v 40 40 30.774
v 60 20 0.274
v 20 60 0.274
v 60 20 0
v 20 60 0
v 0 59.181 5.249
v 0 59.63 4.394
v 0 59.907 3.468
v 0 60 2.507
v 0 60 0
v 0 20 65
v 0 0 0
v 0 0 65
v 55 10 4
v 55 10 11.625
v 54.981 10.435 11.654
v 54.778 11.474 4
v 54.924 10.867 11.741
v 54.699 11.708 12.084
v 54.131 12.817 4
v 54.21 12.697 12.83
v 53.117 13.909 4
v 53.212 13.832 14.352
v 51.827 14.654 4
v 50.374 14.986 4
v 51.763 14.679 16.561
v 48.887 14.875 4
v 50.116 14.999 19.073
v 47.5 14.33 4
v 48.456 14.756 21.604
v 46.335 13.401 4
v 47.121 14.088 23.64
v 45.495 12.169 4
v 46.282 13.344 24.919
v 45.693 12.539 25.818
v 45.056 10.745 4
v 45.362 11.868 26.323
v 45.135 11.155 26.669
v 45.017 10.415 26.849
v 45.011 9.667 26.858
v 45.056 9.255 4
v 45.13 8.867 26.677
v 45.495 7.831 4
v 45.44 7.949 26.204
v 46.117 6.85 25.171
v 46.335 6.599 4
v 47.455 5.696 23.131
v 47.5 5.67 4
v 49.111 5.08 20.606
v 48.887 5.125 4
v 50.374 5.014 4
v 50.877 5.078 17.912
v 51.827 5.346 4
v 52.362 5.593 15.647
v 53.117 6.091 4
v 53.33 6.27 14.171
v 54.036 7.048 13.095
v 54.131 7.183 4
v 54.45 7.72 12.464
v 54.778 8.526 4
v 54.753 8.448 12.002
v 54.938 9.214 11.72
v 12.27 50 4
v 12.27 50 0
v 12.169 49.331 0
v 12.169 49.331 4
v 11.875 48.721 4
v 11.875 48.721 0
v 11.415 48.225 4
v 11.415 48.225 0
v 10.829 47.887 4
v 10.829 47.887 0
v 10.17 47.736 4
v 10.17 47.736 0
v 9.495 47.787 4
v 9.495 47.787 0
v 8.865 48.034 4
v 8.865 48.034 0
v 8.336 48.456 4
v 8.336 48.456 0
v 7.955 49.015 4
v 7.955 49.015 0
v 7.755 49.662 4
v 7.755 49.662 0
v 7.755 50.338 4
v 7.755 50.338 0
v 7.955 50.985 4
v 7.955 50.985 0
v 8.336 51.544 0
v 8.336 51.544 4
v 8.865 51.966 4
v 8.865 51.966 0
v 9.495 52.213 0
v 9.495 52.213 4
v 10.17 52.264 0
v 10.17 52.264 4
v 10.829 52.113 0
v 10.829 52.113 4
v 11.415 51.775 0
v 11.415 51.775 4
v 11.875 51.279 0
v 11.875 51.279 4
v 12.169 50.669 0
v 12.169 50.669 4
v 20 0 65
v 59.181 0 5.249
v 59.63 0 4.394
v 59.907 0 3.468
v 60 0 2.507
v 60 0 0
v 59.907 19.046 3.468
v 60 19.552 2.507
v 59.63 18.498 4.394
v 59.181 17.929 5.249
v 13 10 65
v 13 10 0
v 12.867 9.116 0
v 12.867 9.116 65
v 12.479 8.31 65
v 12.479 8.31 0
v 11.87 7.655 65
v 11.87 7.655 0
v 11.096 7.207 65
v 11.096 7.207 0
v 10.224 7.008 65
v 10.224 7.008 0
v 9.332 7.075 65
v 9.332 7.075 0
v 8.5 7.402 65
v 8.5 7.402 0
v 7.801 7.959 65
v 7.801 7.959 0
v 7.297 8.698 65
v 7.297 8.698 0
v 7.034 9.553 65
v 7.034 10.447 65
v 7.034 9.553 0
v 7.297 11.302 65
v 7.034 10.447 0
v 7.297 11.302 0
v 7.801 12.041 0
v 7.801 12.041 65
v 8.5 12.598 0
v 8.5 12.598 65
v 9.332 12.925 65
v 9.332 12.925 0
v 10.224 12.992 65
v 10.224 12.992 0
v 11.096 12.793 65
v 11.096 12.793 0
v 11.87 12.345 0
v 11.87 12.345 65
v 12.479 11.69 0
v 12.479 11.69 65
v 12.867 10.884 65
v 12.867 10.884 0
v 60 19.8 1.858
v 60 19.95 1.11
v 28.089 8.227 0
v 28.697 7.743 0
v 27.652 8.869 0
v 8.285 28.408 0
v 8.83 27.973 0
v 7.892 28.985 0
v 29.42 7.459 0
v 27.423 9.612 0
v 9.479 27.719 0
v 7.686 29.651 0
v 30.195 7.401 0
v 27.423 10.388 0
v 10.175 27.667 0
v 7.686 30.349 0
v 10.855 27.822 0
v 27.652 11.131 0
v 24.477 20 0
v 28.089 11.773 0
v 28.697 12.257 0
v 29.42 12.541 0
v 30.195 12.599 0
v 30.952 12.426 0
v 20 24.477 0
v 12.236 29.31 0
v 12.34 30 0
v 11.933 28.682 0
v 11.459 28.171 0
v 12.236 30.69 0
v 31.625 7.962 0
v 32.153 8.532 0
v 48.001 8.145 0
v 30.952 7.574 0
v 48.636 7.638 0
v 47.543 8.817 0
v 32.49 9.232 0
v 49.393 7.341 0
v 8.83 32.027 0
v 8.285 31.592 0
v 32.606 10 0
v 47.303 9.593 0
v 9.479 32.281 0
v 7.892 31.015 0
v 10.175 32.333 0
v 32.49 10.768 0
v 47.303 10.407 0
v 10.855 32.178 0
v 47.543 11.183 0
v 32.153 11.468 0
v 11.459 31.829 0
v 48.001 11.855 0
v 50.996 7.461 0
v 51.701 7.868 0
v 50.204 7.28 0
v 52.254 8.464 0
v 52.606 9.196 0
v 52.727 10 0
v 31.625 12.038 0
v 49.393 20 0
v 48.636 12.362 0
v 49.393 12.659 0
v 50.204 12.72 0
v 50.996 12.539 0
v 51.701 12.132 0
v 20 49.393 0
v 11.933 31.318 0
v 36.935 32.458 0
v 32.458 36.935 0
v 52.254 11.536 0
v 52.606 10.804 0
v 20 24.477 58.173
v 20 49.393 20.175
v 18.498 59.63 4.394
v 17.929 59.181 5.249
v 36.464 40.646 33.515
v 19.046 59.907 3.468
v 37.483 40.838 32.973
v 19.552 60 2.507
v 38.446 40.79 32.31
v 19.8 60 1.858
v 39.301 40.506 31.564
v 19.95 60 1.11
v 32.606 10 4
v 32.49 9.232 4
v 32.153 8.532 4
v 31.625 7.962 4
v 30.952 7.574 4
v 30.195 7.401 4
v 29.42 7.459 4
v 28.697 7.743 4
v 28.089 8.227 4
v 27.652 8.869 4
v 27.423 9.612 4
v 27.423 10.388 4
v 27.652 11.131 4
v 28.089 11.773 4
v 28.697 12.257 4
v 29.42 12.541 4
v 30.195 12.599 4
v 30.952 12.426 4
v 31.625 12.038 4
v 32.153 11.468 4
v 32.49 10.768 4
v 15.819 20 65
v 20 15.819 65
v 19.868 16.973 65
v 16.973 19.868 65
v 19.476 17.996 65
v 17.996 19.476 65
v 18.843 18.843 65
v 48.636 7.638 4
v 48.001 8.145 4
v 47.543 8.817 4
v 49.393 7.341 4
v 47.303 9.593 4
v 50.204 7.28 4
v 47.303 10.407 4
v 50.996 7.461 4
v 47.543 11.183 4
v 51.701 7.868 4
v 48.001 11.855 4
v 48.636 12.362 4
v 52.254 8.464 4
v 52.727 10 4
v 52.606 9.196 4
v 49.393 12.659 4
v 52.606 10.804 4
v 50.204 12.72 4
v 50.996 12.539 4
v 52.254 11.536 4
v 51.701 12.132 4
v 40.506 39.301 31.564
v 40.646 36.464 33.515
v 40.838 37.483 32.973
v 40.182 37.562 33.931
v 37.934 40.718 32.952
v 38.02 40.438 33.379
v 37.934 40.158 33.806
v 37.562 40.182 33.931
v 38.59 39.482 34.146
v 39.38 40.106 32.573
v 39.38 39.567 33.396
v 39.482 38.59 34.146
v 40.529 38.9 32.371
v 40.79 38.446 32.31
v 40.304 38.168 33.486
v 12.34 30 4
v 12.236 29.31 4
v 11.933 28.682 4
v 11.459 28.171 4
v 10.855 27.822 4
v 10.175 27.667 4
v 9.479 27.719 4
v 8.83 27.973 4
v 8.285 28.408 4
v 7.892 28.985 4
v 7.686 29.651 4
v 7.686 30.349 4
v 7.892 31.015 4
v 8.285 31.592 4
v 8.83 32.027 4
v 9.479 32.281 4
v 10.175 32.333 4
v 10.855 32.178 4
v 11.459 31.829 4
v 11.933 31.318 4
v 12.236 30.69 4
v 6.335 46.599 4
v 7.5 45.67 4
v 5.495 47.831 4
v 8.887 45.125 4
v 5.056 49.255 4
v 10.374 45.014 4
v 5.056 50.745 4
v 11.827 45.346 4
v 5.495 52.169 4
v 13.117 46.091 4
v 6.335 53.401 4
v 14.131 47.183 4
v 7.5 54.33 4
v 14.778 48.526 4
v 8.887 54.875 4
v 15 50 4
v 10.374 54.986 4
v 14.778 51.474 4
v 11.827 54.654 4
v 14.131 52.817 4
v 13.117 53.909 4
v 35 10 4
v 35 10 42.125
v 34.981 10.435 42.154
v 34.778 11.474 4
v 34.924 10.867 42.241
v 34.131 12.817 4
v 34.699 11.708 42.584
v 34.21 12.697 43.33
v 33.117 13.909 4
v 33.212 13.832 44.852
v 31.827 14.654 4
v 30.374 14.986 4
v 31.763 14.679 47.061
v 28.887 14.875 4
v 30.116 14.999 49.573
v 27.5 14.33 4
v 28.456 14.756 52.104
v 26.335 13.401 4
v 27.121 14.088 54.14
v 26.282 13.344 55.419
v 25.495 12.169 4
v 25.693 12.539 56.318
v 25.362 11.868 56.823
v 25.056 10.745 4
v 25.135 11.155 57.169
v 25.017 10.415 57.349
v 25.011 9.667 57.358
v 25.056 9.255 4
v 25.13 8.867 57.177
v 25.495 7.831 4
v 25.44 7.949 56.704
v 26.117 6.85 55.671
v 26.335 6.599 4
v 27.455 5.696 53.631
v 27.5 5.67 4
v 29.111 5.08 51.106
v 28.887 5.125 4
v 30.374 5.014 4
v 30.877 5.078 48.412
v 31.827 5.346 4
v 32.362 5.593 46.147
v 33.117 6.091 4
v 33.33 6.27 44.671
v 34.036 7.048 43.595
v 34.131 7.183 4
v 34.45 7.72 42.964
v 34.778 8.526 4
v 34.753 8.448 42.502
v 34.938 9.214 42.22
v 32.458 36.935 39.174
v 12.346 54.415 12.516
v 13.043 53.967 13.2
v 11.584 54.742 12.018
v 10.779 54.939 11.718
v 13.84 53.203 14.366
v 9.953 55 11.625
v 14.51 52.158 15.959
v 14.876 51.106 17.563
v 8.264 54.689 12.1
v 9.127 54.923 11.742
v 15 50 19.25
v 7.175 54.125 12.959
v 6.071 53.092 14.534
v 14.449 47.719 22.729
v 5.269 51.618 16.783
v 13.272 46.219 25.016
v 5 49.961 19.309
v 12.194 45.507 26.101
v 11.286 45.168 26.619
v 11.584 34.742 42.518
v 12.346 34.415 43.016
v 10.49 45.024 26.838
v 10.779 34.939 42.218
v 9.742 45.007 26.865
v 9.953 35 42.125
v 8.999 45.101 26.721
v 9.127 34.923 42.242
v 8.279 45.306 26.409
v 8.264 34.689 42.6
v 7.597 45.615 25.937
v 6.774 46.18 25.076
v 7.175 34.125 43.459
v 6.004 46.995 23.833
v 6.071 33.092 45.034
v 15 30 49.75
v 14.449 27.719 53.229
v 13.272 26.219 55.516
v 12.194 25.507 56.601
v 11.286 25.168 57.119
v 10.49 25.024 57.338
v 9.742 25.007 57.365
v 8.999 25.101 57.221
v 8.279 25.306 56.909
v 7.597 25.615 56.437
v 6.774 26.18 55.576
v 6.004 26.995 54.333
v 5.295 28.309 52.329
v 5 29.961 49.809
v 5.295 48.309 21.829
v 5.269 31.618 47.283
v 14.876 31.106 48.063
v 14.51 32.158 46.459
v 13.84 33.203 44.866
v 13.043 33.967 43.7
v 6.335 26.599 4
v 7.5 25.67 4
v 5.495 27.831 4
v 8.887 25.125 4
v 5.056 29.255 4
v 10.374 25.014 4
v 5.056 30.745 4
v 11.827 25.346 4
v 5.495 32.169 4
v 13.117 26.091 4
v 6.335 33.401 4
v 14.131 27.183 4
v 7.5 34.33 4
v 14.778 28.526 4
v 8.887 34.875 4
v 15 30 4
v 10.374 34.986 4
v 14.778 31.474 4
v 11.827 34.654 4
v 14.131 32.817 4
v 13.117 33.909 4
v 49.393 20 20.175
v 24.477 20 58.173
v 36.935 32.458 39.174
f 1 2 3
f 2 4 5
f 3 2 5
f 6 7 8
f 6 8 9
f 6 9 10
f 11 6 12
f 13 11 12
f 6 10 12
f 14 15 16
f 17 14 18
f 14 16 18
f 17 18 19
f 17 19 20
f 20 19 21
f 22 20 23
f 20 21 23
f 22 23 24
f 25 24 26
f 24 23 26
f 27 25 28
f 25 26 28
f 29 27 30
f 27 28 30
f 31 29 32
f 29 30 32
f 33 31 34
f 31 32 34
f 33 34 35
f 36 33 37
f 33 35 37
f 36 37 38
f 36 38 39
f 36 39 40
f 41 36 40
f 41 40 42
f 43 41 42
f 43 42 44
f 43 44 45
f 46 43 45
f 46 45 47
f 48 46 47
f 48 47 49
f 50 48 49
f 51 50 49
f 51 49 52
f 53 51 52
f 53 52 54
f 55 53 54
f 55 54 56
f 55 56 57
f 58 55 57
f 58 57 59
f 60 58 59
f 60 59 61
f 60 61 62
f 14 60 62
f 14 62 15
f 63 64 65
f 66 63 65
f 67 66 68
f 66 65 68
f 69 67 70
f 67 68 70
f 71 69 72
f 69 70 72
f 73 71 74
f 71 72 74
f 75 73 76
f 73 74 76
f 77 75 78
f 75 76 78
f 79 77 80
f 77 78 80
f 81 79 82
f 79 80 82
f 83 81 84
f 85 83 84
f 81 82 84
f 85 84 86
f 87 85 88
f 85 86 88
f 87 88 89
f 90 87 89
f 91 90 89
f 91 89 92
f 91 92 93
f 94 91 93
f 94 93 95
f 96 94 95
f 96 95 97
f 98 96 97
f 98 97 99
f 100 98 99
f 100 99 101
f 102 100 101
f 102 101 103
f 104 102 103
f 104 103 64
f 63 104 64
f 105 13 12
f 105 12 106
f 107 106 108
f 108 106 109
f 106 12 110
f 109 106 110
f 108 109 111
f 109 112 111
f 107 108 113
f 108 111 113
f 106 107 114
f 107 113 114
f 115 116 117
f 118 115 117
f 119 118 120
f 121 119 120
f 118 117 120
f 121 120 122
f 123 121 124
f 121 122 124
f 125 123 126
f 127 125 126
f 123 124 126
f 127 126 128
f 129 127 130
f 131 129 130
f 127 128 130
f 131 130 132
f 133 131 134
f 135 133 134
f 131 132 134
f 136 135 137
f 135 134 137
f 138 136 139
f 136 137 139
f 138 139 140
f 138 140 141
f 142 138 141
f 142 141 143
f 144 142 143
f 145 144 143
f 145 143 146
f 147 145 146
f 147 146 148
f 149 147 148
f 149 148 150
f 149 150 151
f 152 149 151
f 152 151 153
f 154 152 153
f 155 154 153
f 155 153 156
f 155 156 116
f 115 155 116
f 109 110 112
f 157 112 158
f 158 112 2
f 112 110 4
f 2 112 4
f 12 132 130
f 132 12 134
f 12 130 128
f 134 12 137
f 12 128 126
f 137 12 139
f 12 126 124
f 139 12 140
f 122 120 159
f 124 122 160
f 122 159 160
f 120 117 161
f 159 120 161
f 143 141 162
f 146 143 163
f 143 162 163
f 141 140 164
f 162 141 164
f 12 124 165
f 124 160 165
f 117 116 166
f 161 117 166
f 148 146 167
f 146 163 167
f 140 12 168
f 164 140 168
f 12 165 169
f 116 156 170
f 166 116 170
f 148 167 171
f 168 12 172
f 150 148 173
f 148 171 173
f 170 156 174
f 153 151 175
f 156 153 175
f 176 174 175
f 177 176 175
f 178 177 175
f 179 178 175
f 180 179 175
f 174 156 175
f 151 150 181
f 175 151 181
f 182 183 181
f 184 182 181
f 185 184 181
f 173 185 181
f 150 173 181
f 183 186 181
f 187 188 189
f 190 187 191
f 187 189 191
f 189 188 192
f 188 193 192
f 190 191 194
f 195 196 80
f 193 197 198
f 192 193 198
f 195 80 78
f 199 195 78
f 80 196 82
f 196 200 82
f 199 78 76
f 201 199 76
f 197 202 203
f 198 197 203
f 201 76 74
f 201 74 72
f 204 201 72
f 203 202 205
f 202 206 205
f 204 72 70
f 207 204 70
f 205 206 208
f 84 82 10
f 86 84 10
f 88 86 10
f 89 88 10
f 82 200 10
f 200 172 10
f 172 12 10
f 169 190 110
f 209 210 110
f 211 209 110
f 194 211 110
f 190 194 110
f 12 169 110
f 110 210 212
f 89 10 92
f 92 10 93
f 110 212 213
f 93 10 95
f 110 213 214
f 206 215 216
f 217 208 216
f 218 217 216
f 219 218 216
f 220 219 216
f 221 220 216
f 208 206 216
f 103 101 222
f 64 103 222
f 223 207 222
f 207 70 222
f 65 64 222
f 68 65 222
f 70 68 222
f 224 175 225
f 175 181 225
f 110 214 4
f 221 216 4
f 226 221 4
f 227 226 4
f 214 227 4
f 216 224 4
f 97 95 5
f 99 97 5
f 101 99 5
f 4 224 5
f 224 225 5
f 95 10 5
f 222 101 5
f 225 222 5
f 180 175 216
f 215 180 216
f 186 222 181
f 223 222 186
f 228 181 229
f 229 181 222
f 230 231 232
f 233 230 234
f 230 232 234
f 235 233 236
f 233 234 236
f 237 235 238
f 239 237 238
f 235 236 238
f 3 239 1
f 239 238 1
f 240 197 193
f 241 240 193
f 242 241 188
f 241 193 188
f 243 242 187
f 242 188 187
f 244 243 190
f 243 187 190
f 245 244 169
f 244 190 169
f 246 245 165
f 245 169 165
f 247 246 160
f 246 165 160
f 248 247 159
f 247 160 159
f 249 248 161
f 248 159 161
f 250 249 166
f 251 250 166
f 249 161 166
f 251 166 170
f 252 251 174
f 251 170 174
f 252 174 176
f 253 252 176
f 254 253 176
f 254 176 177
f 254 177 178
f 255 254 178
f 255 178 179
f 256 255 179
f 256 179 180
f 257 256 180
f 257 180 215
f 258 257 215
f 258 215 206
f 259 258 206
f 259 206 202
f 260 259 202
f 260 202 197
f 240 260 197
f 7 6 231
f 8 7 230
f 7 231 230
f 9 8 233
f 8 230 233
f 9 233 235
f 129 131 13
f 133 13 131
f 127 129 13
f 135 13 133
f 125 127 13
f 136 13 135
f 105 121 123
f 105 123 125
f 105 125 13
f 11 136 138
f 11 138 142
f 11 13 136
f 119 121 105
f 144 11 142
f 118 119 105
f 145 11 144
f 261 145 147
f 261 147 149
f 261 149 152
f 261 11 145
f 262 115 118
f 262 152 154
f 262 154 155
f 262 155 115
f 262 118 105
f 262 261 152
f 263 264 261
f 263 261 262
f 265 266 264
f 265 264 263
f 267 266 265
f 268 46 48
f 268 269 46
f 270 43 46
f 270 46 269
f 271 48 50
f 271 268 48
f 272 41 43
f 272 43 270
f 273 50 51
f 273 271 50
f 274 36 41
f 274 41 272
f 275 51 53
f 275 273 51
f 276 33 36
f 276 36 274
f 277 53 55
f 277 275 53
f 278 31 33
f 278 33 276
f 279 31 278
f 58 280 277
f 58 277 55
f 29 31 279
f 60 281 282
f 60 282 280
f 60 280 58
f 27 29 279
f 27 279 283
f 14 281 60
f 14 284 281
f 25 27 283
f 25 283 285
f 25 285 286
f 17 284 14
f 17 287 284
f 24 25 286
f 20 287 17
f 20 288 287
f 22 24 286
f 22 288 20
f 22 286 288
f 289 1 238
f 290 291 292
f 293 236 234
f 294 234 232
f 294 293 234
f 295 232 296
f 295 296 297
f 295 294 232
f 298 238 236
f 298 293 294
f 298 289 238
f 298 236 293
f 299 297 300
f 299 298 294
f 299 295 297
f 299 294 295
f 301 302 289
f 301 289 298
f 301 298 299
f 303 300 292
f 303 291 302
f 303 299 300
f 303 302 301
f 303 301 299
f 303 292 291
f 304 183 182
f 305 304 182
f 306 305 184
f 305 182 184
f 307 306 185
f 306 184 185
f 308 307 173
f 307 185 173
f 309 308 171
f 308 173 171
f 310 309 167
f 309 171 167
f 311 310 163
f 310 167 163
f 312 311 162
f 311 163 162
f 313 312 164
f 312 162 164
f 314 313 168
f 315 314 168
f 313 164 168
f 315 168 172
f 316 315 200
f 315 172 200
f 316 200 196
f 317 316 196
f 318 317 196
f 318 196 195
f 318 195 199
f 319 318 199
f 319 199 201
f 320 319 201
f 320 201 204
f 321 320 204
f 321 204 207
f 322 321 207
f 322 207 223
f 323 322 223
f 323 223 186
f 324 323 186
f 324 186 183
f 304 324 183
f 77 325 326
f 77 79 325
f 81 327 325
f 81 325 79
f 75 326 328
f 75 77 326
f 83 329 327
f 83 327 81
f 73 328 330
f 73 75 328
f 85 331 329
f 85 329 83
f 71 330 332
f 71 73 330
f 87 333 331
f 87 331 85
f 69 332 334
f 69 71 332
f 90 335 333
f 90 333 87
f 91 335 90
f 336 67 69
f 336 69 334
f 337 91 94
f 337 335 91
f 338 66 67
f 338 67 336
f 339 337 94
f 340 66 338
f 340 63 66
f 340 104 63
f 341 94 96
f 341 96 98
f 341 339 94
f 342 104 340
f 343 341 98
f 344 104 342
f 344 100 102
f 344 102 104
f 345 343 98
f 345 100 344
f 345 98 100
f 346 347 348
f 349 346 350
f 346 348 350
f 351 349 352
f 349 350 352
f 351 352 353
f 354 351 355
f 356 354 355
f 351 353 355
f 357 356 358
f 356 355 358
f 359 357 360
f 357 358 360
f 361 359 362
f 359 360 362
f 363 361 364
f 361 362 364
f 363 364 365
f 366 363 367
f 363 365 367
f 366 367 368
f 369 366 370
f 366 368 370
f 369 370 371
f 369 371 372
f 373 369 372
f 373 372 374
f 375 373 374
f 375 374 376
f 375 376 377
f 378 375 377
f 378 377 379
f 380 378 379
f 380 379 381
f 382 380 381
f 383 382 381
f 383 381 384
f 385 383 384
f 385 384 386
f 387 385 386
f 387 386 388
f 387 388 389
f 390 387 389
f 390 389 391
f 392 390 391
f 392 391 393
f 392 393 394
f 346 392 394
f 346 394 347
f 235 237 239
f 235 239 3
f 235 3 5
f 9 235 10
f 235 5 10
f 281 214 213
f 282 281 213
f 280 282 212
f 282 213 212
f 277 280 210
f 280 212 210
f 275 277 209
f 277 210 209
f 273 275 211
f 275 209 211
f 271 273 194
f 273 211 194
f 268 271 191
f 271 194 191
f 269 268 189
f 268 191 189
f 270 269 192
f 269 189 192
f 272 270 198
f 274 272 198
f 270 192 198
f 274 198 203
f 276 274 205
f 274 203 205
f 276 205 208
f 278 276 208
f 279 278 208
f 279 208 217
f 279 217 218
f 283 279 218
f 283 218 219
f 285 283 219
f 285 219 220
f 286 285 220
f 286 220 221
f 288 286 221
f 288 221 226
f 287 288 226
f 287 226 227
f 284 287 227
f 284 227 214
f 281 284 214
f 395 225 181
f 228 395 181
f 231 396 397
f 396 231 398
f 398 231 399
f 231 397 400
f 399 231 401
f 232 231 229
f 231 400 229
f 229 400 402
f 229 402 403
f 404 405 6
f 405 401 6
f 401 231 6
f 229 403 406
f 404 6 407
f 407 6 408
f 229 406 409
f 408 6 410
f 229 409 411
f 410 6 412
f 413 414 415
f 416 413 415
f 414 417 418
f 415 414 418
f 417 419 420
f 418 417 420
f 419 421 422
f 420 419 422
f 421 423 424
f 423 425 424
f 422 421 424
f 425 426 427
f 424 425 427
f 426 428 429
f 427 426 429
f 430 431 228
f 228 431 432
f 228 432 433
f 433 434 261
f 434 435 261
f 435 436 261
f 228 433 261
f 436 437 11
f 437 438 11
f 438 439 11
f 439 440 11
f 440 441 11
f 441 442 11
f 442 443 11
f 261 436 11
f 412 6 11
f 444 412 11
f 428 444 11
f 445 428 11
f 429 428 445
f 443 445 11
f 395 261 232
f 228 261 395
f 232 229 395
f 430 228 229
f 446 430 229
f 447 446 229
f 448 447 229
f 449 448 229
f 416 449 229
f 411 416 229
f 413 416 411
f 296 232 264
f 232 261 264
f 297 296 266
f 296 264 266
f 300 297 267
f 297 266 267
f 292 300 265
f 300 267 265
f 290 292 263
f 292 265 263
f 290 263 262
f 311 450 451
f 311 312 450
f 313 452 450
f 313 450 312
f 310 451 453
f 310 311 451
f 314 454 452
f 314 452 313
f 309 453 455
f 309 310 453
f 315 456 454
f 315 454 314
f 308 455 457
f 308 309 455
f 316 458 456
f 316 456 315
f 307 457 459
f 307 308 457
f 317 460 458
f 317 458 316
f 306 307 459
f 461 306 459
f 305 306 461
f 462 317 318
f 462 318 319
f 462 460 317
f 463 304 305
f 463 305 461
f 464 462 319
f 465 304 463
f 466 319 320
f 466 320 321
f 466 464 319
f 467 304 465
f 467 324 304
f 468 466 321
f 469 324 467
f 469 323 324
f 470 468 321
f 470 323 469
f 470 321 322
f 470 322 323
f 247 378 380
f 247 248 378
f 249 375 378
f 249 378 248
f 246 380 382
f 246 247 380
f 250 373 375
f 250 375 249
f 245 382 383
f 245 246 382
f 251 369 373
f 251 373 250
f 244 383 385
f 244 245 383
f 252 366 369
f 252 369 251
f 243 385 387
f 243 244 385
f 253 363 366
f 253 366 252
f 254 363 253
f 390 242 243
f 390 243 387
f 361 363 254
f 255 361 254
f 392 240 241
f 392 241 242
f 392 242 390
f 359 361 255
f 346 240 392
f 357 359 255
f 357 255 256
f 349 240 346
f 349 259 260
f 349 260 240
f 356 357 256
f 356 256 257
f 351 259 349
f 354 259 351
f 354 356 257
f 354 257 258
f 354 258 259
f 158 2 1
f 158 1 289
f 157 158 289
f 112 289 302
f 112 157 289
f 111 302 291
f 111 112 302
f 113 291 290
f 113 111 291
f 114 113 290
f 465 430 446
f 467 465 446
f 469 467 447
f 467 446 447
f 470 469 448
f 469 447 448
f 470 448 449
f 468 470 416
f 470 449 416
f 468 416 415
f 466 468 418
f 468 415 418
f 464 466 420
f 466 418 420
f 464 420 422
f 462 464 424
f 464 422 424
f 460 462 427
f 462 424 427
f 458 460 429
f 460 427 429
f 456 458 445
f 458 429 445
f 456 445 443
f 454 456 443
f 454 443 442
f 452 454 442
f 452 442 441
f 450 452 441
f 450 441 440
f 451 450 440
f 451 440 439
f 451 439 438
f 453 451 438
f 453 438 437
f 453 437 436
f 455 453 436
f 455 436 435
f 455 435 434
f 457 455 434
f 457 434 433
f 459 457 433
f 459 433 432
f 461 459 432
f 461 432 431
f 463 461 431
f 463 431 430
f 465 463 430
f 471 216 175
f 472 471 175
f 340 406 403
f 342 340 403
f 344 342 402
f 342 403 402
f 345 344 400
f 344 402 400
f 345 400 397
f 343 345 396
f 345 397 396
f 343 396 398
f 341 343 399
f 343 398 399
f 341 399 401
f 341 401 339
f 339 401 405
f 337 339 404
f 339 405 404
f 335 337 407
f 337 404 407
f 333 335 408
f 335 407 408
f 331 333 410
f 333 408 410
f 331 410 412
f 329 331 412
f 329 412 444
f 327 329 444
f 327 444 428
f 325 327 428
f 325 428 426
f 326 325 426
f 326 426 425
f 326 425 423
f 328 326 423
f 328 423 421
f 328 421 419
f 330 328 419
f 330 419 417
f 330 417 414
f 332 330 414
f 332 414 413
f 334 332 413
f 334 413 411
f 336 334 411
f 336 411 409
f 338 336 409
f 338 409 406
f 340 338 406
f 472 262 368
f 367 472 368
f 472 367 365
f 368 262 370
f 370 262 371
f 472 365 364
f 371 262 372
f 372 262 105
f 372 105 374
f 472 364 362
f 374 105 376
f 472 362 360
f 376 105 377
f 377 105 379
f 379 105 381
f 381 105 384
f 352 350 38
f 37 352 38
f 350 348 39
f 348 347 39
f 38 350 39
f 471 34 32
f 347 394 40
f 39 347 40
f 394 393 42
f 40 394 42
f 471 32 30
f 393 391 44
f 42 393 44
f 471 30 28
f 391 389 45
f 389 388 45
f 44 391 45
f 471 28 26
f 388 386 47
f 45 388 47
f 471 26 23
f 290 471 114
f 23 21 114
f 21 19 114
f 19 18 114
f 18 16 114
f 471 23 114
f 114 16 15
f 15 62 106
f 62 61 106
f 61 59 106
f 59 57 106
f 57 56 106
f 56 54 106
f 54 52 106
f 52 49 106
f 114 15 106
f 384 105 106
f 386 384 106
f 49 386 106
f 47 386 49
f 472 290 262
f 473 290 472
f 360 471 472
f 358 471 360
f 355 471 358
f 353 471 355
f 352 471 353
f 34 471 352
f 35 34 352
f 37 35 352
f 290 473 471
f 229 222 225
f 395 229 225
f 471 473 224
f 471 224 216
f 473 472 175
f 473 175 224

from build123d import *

# Parameters (mm, degrees)
F1_DEPTH  = 65
F3_DEPTH  = 60.001
F5_DEPTH  = 60.001
F6_R      = 2.5
F6_R_2    = 2.6062767238
F6_R_3    = 2.7274571226
F6_R_4    = 2.3400008441
F6_R_5    = 2.2698965194
F7_DEPTH  = 65.001
F8_R      = 5
F9_DEPTH  = 61
F10_R     = 5
F11_R     = 3
F12_DEPTH = 65.001


with BuildPart() as f1:
    # F0 (on Top) → F1 (new body)
    with BuildSketch(Plane.XY):
        Polygon((0, 60), (0, 0), (60, 0), (60, 20), (20, 60), align=None)
        Polygon((49.3933982822, 20), (24.4768448174, 20), (36.9351215498, 32.4582767324), align=None, mode=Mode.SUBTRACT)
        Polygon((32.4582767324, 36.9351215498), (20, 24.4768448174), (20, 49.3933982822), align=None, mode=Mode.SUBTRACT)
    extrude(amount=F1_DEPTH)

    # F2 (on face) → F3 (cut, through all)
    with BuildSketch(Plane.XZ):
        Polygon((60, 65), (20, 65), (60, 4), align=None)
    extrude(amount=-F3_DEPTH, mode=Mode.SUBTRACT)

    # F4 (on face) → F5 (cut, through all)
    with BuildSketch(Plane(origin=(0, 0, 0), x_dir=(0, -1, 0), z_dir=(-1, 0, 0))):
        Polygon((-60, 65), (-60, 4), (-20, 65), align=None)
    extrude(amount=-F5_DEPTH, mode=Mode.SUBTRACT)

    # F6 (on face) → F7 (cut, through all)
    with BuildSketch(Plane(origin=(0, 0, 0), x_dir=(1, 0, 0), z_dir=(0, 0, -1))):
        with Locations((10, -10)):
            Circle(F6_R)
        with Locations((30, -10)):
            Circle(F6_R_2)
        with Locations((50, -10)):
            Circle(F6_R_3)
        with Locations((10, -30)):
            Circle(F6_R_4)
        with Locations((10, -50)):
            Circle(F6_R_5)
    extrude(amount=-F7_DEPTH, mode=Mode.SUBTRACT)

    # F8 (on face) → F9 (cut)
    with BuildSketch(Plane.XY.offset(65)):
        with Locations((30, 10)):
            Circle(F8_R)
        with Locations((50, 10)):
            Circle(F8_R)
        with Locations((10, 30)):
            Circle(F8_R)
        with Locations((10, 50)):
            Circle(F8_R)
    extrude(amount=-F9_DEPTH, mode=Mode.SUBTRACT)

    # F10
    f10_edges = [f1.edges().sort_by_distance(p)[0] for p in [
        (50, 30, 19.25),
        (30, 50, 19.25),
        (60, 10, 4),
        (10, 60, 4),
        (30, 30, 49.75),
    ]]
    fillet(f10_edges, radius=F10_R)

    # F11 (on face) → F12 (cut, through all)
    with BuildSketch(Plane(origin=(0, 0, 0), x_dir=(1, 0, 0), z_dir=(0, 0, -1))):
        with Locations((10, -10)):
            Circle(F11_R)
    extrude(amount=-F12_DEPTH, mode=Mode.SUBTRACT)


solid = f1.part
